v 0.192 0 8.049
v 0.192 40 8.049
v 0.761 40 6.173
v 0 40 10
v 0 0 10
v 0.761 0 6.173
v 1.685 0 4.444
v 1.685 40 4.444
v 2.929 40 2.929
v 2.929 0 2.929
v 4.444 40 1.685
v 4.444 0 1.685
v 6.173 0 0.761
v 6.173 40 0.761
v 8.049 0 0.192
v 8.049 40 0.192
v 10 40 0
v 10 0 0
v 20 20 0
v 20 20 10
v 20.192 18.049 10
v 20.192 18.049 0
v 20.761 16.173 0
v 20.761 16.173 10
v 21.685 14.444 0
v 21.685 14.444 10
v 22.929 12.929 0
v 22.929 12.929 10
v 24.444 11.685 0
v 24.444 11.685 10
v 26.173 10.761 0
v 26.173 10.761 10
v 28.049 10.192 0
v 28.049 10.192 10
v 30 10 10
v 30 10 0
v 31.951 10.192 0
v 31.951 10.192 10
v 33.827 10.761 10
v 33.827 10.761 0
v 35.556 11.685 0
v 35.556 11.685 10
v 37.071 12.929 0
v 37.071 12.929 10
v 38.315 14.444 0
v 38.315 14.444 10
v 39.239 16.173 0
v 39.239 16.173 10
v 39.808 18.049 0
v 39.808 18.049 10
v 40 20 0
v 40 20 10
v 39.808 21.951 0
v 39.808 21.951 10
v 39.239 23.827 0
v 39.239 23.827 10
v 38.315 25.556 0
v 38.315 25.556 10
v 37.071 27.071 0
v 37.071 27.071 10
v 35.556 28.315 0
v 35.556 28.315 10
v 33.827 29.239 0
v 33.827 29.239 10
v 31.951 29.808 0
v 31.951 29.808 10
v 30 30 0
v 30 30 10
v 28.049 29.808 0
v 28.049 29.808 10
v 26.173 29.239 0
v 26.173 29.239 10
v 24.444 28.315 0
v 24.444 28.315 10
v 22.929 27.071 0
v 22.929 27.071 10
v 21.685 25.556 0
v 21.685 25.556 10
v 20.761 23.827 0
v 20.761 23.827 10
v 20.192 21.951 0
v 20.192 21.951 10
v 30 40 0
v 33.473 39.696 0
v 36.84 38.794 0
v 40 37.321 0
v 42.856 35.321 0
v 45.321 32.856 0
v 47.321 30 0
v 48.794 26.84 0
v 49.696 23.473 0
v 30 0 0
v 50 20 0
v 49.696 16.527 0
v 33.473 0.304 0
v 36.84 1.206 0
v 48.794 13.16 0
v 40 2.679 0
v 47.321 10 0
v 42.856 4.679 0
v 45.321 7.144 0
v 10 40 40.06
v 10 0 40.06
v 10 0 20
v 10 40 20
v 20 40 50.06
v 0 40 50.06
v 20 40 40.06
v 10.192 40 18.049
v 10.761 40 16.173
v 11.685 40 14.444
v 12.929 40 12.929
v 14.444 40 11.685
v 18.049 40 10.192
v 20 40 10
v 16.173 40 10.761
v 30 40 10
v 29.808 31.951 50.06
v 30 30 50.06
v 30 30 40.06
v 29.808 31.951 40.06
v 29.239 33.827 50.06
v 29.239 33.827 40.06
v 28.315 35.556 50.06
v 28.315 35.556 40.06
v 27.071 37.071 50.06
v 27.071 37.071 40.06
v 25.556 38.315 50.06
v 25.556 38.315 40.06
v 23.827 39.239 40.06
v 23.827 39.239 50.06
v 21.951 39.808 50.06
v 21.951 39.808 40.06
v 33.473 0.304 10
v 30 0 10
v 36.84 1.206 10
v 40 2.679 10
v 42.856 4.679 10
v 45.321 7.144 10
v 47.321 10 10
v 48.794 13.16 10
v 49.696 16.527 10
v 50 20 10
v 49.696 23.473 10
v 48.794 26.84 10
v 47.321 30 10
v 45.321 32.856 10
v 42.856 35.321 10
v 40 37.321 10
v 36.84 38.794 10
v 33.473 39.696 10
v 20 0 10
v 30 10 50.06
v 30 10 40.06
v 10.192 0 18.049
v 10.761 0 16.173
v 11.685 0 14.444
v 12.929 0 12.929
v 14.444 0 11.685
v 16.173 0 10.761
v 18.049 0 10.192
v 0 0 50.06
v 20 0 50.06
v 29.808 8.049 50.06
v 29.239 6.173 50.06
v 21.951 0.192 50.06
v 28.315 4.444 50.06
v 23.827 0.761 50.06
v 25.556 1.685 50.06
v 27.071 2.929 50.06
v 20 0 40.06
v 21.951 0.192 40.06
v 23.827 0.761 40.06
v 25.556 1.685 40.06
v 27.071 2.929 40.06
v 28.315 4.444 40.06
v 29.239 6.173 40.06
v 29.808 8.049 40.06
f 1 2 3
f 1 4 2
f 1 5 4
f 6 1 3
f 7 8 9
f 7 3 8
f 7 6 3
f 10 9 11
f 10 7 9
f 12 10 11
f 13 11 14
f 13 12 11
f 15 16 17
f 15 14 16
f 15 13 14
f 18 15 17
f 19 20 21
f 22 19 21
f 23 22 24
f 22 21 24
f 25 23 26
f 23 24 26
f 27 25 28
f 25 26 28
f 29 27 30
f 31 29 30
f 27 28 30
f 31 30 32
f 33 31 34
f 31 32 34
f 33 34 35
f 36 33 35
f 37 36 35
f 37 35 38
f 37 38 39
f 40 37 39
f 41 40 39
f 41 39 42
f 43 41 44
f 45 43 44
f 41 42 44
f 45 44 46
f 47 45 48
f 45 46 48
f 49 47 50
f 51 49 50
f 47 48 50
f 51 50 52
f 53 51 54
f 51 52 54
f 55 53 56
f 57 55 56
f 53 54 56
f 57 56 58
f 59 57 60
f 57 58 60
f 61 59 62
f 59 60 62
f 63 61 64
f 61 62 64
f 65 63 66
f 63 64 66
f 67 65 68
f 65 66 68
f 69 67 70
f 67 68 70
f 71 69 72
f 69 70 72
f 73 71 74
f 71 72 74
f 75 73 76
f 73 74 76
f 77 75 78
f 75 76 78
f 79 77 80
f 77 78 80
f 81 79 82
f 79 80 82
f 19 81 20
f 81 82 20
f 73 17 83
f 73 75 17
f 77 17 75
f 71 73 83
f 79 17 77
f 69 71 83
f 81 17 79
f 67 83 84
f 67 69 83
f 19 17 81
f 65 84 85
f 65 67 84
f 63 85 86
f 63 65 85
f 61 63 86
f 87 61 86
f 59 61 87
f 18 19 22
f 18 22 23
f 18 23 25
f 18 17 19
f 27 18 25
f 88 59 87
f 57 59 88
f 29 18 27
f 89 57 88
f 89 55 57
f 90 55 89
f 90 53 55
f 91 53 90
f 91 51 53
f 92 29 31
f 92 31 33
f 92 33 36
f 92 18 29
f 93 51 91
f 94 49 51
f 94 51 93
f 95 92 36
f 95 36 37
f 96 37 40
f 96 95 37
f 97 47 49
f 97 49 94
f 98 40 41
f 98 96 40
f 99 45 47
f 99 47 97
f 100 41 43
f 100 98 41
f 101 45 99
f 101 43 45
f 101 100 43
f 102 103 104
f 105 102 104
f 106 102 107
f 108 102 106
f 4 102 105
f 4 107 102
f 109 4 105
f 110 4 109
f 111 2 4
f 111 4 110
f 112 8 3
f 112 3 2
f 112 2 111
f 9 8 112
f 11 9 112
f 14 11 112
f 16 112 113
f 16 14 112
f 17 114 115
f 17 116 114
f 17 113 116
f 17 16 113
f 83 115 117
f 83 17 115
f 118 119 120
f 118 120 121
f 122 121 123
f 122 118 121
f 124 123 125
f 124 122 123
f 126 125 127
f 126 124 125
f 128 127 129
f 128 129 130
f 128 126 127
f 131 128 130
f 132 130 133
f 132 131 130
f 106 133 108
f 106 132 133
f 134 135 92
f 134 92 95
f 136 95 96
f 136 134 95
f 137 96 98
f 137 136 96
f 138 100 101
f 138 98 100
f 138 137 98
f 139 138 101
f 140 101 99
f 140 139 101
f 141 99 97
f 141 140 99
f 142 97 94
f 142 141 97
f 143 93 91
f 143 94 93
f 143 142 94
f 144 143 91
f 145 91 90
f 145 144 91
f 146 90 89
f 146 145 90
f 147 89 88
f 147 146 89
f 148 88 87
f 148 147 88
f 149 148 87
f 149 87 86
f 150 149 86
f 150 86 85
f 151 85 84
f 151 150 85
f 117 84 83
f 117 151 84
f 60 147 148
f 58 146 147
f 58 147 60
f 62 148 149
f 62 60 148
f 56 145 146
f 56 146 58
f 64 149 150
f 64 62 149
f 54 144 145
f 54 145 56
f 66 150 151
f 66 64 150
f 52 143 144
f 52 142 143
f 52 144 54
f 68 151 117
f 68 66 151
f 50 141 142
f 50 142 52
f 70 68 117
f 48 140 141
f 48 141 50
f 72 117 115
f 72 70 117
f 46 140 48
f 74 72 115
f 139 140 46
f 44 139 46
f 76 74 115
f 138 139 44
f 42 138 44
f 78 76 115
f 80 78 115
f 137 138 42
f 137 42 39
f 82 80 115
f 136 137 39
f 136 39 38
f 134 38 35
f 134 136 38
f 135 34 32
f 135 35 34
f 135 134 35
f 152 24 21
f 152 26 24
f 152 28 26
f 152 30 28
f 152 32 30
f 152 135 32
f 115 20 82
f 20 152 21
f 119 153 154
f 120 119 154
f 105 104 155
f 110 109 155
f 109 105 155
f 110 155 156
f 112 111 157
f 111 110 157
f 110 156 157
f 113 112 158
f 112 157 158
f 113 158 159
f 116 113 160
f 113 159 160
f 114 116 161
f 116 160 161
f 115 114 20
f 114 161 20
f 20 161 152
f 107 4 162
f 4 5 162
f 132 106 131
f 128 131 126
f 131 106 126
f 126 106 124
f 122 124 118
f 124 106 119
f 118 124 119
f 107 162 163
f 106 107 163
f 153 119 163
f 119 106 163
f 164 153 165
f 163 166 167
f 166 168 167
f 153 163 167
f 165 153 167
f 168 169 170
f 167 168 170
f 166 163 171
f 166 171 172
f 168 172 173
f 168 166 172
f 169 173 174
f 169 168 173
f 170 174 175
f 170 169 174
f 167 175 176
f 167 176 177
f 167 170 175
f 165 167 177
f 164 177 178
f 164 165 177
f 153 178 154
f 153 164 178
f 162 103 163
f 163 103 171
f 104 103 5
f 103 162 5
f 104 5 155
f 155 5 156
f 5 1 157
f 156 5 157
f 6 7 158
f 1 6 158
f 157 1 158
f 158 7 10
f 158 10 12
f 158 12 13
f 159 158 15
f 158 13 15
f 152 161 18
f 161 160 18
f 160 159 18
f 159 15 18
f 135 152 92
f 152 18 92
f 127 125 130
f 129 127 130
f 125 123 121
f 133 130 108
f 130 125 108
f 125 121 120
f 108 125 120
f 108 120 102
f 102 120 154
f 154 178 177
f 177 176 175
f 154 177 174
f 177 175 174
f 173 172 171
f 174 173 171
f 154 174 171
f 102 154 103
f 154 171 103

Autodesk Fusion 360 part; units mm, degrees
sketch "Sketch2" plane through (0, 0, 0) normal (0, 1, 0) x (1, 0, 0)
  line L0 (0, -10) -> (0, -50.06)
  line L1 (0, -50.06) -> (30, -50.06)
  line L2 (30, -50.06) -> (30, -40.06)
  line L3 (10, 0) -> (50, 0)
  line L4 (50, 0) -> (50, -10)
  arc A0 (10, 0) -> (0, -10) centre (10, -10) ccw
  line L5 (50, -10) -> (20, -10)
  line L6 (30, -40.06) -> (10, -40.06)
  line L7 (10, -40.06) -> (10, -20)
  arc A1 (20, -10) -> (10, -20) centre (20, -20) ccw
  point P0 (10, -10)
  dimension "d9" = 50.06
  dimension "d10" = 30
  dimension "d11" = 10
  dimension "d12" = 50
  dimension "d13" = 10
  dimension "d14" = 10
  dimension "d15" = 40
  dimension "d16" = 20
  dimension "d17" = 10
extrude "Extrude1" add sketch "Sketch2" along normal blind 40
sketch "Sketch5" plane through (0, 0, 50.06) normal (0, 0, 1) x (-1, 0, 0)
  line L0 (0, 0) -> (-30, 0)
  line L1 (-30, 0) -> (-30, -40)
  line L2 (-30, -40) -> (0, -40)
  line L3 (0, -40) -> (0, 0)
  line L4 (0, 0) -> (-20, 0)
  line L5 (-30, -10) -> (-30, -30)
  line L6 (-20, -40) -> (0, -40)
  line L7 (0, -40) -> (0, 0)
  arc A0 (-30, -30) -> (-20, -40) centre (-20, -30) ccw
  arc A1 (-20, 0) -> (-30, -10) centre (-20, -10) ccw
  dimension "d24" = 10
  dimension "d25" = 10
extrude "Extrude2" cut sketch "Sketch5" against normal blind 10 contours L0 L1 A1
extrude "Extrude3" cut sketch "Sketch5" against normal blind 10 contours L1 L2 A0
sketch "Sketch6" plane through (0, 0, 10) normal (0, 0, 1) x (-1, 0, 0)
  line L0 (-20, 0) -> (-50, 0)
  line L1 (-50, 0) -> (-50, -40)
  line L2 (-50, -40) -> (-20, -40)
  line L3 (-20, -40) -> (-20, 0)
  line L4 (-20, 0) -> (-30, 0)
  circle A0 centre (-30, -20) radius 10
  circle A1 centre (-30, -20) radius 20
  dimension "d30" = 10
extrude "Extrude4" cut sketch "Sketch6" against normal blind 10 contours A0
extrude "Extrude5" cut sketch "Sketch6" against normal blind 10 contours L0 L1 A1
extrude "Extrude6" cut sketch "Sketch6" against normal blind 10 contours L1 L2 A1
